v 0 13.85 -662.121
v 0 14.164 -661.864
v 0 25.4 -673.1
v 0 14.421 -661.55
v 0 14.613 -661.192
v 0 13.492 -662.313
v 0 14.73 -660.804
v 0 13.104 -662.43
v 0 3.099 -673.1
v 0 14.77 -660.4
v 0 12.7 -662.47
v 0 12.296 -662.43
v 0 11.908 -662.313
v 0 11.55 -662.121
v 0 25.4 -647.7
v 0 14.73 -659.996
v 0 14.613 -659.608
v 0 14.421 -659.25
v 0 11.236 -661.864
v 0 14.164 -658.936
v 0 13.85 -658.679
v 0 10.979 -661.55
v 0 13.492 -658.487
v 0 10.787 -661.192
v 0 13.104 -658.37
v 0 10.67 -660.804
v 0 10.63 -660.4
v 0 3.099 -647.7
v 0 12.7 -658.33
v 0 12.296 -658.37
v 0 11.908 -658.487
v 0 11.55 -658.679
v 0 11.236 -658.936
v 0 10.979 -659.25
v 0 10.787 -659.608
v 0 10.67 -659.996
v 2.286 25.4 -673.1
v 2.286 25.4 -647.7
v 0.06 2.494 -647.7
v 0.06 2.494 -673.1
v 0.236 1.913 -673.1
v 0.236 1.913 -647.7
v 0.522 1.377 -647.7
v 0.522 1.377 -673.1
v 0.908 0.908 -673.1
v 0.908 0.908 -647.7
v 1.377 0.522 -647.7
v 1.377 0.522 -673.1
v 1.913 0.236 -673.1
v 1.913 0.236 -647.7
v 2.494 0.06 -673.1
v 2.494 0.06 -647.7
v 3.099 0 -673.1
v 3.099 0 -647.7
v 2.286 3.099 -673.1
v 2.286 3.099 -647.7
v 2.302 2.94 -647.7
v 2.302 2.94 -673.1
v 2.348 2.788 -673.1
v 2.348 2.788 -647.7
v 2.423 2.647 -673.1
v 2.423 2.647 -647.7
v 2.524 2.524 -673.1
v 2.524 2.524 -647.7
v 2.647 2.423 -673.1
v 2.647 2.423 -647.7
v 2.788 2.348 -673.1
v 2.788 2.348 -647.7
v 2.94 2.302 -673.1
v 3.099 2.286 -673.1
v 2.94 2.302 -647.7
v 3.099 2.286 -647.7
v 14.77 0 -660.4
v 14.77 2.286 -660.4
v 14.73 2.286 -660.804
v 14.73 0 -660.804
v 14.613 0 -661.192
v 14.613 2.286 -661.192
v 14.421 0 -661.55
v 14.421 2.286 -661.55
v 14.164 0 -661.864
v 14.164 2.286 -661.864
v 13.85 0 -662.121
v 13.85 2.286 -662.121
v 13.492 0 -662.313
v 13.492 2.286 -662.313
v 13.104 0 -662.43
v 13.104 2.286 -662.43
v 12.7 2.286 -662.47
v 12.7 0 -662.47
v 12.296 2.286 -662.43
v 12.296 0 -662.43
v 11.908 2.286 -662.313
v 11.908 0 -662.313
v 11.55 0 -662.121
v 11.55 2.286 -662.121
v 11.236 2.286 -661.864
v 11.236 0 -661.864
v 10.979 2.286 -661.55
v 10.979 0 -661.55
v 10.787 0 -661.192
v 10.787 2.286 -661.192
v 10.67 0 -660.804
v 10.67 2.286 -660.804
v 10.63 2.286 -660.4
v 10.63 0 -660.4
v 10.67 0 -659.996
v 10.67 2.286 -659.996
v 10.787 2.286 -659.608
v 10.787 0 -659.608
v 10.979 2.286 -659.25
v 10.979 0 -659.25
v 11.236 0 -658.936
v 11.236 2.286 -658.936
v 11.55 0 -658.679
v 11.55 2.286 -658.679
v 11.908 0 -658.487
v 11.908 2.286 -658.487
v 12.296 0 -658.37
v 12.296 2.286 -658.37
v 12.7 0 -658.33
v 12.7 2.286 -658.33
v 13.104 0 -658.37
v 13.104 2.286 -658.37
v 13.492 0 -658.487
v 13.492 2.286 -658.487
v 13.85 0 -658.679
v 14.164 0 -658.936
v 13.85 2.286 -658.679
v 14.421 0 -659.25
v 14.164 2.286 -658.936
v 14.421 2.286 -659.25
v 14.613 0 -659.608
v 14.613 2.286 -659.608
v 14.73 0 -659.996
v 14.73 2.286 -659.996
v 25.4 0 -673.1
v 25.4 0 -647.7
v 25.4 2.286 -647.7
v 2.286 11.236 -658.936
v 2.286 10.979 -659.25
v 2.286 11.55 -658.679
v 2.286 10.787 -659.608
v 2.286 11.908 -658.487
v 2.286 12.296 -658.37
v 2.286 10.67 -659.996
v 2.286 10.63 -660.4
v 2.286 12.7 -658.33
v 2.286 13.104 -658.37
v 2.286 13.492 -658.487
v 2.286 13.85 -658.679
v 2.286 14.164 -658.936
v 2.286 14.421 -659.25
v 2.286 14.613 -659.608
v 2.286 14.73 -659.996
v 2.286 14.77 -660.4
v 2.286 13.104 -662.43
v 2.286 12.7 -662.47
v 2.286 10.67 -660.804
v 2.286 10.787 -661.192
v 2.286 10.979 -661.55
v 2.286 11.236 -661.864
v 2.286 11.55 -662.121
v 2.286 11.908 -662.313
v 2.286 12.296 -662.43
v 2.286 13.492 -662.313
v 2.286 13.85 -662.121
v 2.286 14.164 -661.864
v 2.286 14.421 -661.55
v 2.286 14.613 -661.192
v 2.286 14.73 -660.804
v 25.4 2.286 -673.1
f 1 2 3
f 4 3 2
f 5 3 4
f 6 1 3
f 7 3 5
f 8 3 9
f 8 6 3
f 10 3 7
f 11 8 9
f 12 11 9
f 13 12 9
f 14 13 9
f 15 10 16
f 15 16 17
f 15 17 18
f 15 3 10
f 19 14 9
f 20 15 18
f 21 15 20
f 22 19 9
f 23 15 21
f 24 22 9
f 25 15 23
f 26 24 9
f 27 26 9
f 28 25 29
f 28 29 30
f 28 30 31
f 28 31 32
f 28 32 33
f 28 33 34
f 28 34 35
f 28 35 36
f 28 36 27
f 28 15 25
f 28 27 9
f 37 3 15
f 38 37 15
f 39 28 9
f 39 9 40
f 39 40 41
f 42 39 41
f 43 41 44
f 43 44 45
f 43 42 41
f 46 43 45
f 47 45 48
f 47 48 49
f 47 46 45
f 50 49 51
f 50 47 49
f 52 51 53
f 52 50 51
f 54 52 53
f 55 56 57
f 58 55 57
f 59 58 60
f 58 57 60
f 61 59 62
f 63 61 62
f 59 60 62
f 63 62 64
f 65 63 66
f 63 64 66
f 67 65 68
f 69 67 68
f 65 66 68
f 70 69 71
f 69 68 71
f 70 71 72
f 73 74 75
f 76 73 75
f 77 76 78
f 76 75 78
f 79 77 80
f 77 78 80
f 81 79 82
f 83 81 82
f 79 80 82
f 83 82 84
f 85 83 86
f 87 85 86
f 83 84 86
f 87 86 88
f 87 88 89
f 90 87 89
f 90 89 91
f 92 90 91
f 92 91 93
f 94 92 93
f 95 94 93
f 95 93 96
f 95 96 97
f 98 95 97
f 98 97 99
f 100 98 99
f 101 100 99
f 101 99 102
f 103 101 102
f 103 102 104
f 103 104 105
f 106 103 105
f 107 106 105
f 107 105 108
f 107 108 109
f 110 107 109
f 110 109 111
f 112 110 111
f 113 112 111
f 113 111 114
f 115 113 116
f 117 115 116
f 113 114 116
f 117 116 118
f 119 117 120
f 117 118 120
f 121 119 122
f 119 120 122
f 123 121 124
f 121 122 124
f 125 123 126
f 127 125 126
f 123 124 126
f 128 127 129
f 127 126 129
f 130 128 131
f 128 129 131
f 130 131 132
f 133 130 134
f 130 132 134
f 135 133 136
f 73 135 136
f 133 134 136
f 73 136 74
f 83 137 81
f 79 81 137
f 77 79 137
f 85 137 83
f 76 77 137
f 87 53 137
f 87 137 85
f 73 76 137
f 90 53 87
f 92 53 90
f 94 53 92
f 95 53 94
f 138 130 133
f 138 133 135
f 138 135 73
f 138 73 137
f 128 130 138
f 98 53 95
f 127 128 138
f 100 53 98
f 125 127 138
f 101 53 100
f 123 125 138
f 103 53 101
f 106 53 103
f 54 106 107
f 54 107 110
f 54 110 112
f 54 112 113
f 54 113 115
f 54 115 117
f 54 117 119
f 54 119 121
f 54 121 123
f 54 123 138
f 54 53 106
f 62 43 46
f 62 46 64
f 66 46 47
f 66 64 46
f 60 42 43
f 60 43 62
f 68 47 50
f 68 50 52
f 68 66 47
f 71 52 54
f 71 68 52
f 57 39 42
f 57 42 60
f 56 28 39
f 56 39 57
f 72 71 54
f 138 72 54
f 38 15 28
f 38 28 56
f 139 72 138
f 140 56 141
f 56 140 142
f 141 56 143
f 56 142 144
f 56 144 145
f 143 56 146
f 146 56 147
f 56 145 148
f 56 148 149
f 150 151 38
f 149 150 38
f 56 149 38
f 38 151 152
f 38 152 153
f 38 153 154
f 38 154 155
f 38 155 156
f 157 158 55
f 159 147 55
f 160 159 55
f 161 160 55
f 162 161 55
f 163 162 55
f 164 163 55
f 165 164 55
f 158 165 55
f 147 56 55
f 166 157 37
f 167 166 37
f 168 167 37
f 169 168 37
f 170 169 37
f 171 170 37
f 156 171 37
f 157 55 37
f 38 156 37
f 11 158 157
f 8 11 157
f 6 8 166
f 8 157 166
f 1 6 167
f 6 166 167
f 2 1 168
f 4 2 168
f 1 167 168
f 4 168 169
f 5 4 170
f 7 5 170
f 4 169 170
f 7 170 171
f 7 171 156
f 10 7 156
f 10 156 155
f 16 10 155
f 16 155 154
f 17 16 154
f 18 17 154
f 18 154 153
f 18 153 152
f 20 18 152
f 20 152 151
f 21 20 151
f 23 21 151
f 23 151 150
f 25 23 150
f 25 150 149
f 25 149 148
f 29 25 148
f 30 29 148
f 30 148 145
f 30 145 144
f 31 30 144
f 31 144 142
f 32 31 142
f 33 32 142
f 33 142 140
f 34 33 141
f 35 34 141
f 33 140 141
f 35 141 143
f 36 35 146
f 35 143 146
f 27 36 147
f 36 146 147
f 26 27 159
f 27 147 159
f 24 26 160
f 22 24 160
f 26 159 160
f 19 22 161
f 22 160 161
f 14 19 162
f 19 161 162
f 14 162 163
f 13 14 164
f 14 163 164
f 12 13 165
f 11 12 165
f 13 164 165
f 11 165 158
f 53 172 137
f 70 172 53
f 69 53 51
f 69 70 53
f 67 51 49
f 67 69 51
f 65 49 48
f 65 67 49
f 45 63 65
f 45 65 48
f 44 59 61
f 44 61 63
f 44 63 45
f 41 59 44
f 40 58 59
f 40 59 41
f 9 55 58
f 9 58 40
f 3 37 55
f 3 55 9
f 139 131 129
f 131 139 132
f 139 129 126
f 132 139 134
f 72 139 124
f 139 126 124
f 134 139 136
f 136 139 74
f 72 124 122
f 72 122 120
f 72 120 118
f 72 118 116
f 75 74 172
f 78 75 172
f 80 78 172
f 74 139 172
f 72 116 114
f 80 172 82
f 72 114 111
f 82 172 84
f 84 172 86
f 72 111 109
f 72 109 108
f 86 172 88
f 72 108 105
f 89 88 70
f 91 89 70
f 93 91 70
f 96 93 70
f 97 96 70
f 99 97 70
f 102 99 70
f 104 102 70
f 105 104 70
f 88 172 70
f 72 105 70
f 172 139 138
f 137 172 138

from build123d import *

# Parameters (mm, degrees)
SKETCH1_W                  = 25.4
SKETCH1_H                  = 1498.6
BOSS_EXTRUDE1_DEPTH        = 25.4
SKETCH2_W                  = 23.114
SKETCH2_H                  = 23.114
CUT_EXTRUDE1_DEPTH         = 1499.6
M3_5_CLEARANCE_HOLE1_D     = 4.1402
M3_5_CLEARANCE_HOLE1_DEPTH = 25.4
M3_5_CLEARANCE_HOLE2_D     = 4.1402
M3_5_CLEARANCE_HOLE2_DEPTH = 25.4
CHAMFER1_SIZE              = 2.159
FILLET1_R                  = 0.8128
FILLET2_R                  = 3.0988
SKETCH8_W                  = 95.882963774
SKETCH8_H                  = 79.338329604
CUT_EXTRUDE3_DEPTH         = 1371.6
SKETCH9_W                  = 56.924523055
SKETCH9_H                  = 51.282783217
CUT_EXTRUDE4_DEPTH         = 76.2
SKETCH10_W                 = 57.247248429
SKETCH10_H                 = 53.712272172
CUT_EXTRUDE5_DEPTH         = 25.4


with BuildPart() as part:
    # Sketch1 → Boss-Extrude1 (new body)
    with BuildSketch(Plane(origin=(0, 0, 0), x_dir=(0, -1, 0), z_dir=(-1, 0, 0))):
        with Locations((-12.7, 0)):
            Rectangle(SKETCH1_W, SKETCH1_H)
    extrude(amount=-BOSS_EXTRUDE1_DEPTH)

    # Sketch2 → Cut-Extrude1 (cut, through all)
    with BuildSketch(Plane(origin=(0, 0, -749.3), x_dir=(-1, 0, 0), z_dir=(0, 0, -1))):
        with Locations((-13.843, 13.843)):
            Rectangle(SKETCH2_W, SKETCH2_H)
    extrude(amount=-CUT_EXTRUDE1_DEPTH, mode=Mode.SUBTRACT)

    # M3.5 Clearance Hole1
    with Locations(Plane(origin=(0, 0, 0), x_dir=(-1, 0, 0), z_dir=(0, -1, 0))):
        with Locations((-12.7, 736.6), (-12.7, 711.2), (-12.7, 685.8), (-12.7, 660.4), (-12.7, 635), (-12.7, 609.6), (-12.7, 584.2), (-12.7, 558.8), (-12.7, 533.4), (-12.7, 508), (-12.7, 482.6), (-12.7, 457.2), (-12.7, 431.8), (-12.7, 406.4), (-12.7, 381), (-12.7, 355.6), (-12.7, 330.2), (-12.7, 304.8), (-12.7, 279.4), (-12.7, 254), (-12.7, 228.6), (-12.7, 203.2), (-12.7, 177.8), (-12.7, 152.4), (-12.7, 127), (-12.7, 101.6), (-12.7, 76.2), (-12.7, 50.8), (-12.7, 25.4), (-12.7, 0), (-12.7, -25.4), (-12.7, -50.8), (-12.7, -76.2), (-12.7, -101.6), (-12.7, -127), (-12.7, -152.4), (-12.7, -177.8), (-12.7, -203.2), (-12.7, -228.6), (-12.7, -254), (-12.7, -279.4), (-12.7, -304.8), (-12.7, -330.2), (-12.7, -355.6), (-12.7, -381), (-12.7, -406.4), (-12.7, -431.8), (-12.7, -457.2), (-12.7, -482.6), (-12.7, -508), (-12.7, -533.4), (-12.7, -558.8), (-12.7, -584.2), (-12.7, -609.6), (-12.7, -635), (-12.7, -660.4), (-12.7, -685.8), (-12.7, -711.2), (-12.7, -736.6)):
            Hole(M3_5_CLEARANCE_HOLE1_D / 2, depth=M3_5_CLEARANCE_HOLE1_DEPTH)

    # M3.5 Clearance Hole2
    with Locations(Plane.ZY):
        with Locations((711.2, 12.7), (736.6, 12.7), (685.8, 12.7), (660.4, 12.7), (635, 12.7), (609.6, 12.7), (584.2, 12.7), (558.8, 12.7), (533.4, 12.7), (508, 12.7), (482.6, 12.7), (457.2, 12.7), (431.8, 12.7), (406.4, 12.7), (381, 12.7), (355.6, 12.7), (330.2, 12.7), (304.8, 12.7), (279.4, 12.7), (254, 12.7), (228.6, 12.7), (203.2, 12.7), (177.8, 12.7), (152.4, 12.7), (127, 12.7), (101.6, 12.7), (76.2, 12.7), (50.8, 12.7), (25.4, 12.7), (0, 12.7), (-25.4, 12.7), (-50.8, 12.7), (-76.2, 12.7), (-101.6, 12.7), (-127, 12.7), (-152.4, 12.7), (-177.8, 12.7), (-203.2, 12.7), (-228.6, 12.7), (-254, 12.7), (-279.4, 12.7), (-304.8, 12.7), (-330.2, 12.7), (-355.6, 12.7), (-381, 12.7), (-406.4, 12.7), (-431.8, 12.7), (-457.2, 12.7), (-482.6, 12.7), (-508, 12.7), (-533.4, 12.7), (-558.8, 12.7), (-584.2, 12.7), (-609.6, 12.7), (-635, 12.7), (-660.4, 12.7), (-685.8, 12.7), (-711.2, 12.7), (-736.6, 12.7)):
            Hole(M3_5_CLEARANCE_HOLE2_D / 2, depth=M3_5_CLEARANCE_HOLE2_DEPTH)

    # Chamfer1
    chamfer1_edges = [part.edges().sort_by_distance(p)[0] for p in [
        (25.4, 1.143, -749.3),
        (1.143, 25.4, 749.3),
        (1.143, 25.4, -749.3),
        (25.4, 1.143, 749.3),
    ]]
    chamfer(chamfer1_edges, length=CHAMFER1_SIZE)

    # Fillet1
    fillet1_edges = [part.edges().sort_by_distance(p)[0] for p in [
        (2.286, 2.286, 0),
    ]]
    fillet(fillet1_edges, radius=FILLET1_R)

    # Fillet2
    fillet2_edges = [part.edges().sort_by_distance(p)[0] for p in [
        (0, 0, 0),
    ]]
    fillet(fillet2_edges, radius=FILLET2_R)

    # Sketch8 → Cut-Extrude3 (cut)
    with BuildSketch(Plane.XY.offset(749.3)):
        with Locations((2.286, 3.0988)):
            Rectangle(SKETCH8_W, SKETCH8_H)
    extrude(amount=-CUT_EXTRUDE3_DEPTH, mode=Mode.SUBTRACT)

    # Sketch9 → Cut-Extrude4 (cut)
    with BuildSketch(Plane(origin=(0, 0, -749.3), x_dir=(-1, 0, 0), z_dir=(0, 0, -1))):
        with Locations((-2.180776643, 1.30746368)):
            Rectangle(SKETCH9_W, SKETCH9_H)
    extrude(amount=-CUT_EXTRUDE4_DEPTH, mode=Mode.SUBTRACT)

    # Sketch10 → Cut-Extrude5 (cut)
    with BuildSketch(Plane.XY.offset(-622.3)):
        with Locations((2.141729058, 1.213934322)):
            Rectangle(SKETCH10_W, SKETCH10_H)
    extrude(amount=-CUT_EXTRUDE5_DEPTH, mode=Mode.SUBTRACT)


solid = part.part
